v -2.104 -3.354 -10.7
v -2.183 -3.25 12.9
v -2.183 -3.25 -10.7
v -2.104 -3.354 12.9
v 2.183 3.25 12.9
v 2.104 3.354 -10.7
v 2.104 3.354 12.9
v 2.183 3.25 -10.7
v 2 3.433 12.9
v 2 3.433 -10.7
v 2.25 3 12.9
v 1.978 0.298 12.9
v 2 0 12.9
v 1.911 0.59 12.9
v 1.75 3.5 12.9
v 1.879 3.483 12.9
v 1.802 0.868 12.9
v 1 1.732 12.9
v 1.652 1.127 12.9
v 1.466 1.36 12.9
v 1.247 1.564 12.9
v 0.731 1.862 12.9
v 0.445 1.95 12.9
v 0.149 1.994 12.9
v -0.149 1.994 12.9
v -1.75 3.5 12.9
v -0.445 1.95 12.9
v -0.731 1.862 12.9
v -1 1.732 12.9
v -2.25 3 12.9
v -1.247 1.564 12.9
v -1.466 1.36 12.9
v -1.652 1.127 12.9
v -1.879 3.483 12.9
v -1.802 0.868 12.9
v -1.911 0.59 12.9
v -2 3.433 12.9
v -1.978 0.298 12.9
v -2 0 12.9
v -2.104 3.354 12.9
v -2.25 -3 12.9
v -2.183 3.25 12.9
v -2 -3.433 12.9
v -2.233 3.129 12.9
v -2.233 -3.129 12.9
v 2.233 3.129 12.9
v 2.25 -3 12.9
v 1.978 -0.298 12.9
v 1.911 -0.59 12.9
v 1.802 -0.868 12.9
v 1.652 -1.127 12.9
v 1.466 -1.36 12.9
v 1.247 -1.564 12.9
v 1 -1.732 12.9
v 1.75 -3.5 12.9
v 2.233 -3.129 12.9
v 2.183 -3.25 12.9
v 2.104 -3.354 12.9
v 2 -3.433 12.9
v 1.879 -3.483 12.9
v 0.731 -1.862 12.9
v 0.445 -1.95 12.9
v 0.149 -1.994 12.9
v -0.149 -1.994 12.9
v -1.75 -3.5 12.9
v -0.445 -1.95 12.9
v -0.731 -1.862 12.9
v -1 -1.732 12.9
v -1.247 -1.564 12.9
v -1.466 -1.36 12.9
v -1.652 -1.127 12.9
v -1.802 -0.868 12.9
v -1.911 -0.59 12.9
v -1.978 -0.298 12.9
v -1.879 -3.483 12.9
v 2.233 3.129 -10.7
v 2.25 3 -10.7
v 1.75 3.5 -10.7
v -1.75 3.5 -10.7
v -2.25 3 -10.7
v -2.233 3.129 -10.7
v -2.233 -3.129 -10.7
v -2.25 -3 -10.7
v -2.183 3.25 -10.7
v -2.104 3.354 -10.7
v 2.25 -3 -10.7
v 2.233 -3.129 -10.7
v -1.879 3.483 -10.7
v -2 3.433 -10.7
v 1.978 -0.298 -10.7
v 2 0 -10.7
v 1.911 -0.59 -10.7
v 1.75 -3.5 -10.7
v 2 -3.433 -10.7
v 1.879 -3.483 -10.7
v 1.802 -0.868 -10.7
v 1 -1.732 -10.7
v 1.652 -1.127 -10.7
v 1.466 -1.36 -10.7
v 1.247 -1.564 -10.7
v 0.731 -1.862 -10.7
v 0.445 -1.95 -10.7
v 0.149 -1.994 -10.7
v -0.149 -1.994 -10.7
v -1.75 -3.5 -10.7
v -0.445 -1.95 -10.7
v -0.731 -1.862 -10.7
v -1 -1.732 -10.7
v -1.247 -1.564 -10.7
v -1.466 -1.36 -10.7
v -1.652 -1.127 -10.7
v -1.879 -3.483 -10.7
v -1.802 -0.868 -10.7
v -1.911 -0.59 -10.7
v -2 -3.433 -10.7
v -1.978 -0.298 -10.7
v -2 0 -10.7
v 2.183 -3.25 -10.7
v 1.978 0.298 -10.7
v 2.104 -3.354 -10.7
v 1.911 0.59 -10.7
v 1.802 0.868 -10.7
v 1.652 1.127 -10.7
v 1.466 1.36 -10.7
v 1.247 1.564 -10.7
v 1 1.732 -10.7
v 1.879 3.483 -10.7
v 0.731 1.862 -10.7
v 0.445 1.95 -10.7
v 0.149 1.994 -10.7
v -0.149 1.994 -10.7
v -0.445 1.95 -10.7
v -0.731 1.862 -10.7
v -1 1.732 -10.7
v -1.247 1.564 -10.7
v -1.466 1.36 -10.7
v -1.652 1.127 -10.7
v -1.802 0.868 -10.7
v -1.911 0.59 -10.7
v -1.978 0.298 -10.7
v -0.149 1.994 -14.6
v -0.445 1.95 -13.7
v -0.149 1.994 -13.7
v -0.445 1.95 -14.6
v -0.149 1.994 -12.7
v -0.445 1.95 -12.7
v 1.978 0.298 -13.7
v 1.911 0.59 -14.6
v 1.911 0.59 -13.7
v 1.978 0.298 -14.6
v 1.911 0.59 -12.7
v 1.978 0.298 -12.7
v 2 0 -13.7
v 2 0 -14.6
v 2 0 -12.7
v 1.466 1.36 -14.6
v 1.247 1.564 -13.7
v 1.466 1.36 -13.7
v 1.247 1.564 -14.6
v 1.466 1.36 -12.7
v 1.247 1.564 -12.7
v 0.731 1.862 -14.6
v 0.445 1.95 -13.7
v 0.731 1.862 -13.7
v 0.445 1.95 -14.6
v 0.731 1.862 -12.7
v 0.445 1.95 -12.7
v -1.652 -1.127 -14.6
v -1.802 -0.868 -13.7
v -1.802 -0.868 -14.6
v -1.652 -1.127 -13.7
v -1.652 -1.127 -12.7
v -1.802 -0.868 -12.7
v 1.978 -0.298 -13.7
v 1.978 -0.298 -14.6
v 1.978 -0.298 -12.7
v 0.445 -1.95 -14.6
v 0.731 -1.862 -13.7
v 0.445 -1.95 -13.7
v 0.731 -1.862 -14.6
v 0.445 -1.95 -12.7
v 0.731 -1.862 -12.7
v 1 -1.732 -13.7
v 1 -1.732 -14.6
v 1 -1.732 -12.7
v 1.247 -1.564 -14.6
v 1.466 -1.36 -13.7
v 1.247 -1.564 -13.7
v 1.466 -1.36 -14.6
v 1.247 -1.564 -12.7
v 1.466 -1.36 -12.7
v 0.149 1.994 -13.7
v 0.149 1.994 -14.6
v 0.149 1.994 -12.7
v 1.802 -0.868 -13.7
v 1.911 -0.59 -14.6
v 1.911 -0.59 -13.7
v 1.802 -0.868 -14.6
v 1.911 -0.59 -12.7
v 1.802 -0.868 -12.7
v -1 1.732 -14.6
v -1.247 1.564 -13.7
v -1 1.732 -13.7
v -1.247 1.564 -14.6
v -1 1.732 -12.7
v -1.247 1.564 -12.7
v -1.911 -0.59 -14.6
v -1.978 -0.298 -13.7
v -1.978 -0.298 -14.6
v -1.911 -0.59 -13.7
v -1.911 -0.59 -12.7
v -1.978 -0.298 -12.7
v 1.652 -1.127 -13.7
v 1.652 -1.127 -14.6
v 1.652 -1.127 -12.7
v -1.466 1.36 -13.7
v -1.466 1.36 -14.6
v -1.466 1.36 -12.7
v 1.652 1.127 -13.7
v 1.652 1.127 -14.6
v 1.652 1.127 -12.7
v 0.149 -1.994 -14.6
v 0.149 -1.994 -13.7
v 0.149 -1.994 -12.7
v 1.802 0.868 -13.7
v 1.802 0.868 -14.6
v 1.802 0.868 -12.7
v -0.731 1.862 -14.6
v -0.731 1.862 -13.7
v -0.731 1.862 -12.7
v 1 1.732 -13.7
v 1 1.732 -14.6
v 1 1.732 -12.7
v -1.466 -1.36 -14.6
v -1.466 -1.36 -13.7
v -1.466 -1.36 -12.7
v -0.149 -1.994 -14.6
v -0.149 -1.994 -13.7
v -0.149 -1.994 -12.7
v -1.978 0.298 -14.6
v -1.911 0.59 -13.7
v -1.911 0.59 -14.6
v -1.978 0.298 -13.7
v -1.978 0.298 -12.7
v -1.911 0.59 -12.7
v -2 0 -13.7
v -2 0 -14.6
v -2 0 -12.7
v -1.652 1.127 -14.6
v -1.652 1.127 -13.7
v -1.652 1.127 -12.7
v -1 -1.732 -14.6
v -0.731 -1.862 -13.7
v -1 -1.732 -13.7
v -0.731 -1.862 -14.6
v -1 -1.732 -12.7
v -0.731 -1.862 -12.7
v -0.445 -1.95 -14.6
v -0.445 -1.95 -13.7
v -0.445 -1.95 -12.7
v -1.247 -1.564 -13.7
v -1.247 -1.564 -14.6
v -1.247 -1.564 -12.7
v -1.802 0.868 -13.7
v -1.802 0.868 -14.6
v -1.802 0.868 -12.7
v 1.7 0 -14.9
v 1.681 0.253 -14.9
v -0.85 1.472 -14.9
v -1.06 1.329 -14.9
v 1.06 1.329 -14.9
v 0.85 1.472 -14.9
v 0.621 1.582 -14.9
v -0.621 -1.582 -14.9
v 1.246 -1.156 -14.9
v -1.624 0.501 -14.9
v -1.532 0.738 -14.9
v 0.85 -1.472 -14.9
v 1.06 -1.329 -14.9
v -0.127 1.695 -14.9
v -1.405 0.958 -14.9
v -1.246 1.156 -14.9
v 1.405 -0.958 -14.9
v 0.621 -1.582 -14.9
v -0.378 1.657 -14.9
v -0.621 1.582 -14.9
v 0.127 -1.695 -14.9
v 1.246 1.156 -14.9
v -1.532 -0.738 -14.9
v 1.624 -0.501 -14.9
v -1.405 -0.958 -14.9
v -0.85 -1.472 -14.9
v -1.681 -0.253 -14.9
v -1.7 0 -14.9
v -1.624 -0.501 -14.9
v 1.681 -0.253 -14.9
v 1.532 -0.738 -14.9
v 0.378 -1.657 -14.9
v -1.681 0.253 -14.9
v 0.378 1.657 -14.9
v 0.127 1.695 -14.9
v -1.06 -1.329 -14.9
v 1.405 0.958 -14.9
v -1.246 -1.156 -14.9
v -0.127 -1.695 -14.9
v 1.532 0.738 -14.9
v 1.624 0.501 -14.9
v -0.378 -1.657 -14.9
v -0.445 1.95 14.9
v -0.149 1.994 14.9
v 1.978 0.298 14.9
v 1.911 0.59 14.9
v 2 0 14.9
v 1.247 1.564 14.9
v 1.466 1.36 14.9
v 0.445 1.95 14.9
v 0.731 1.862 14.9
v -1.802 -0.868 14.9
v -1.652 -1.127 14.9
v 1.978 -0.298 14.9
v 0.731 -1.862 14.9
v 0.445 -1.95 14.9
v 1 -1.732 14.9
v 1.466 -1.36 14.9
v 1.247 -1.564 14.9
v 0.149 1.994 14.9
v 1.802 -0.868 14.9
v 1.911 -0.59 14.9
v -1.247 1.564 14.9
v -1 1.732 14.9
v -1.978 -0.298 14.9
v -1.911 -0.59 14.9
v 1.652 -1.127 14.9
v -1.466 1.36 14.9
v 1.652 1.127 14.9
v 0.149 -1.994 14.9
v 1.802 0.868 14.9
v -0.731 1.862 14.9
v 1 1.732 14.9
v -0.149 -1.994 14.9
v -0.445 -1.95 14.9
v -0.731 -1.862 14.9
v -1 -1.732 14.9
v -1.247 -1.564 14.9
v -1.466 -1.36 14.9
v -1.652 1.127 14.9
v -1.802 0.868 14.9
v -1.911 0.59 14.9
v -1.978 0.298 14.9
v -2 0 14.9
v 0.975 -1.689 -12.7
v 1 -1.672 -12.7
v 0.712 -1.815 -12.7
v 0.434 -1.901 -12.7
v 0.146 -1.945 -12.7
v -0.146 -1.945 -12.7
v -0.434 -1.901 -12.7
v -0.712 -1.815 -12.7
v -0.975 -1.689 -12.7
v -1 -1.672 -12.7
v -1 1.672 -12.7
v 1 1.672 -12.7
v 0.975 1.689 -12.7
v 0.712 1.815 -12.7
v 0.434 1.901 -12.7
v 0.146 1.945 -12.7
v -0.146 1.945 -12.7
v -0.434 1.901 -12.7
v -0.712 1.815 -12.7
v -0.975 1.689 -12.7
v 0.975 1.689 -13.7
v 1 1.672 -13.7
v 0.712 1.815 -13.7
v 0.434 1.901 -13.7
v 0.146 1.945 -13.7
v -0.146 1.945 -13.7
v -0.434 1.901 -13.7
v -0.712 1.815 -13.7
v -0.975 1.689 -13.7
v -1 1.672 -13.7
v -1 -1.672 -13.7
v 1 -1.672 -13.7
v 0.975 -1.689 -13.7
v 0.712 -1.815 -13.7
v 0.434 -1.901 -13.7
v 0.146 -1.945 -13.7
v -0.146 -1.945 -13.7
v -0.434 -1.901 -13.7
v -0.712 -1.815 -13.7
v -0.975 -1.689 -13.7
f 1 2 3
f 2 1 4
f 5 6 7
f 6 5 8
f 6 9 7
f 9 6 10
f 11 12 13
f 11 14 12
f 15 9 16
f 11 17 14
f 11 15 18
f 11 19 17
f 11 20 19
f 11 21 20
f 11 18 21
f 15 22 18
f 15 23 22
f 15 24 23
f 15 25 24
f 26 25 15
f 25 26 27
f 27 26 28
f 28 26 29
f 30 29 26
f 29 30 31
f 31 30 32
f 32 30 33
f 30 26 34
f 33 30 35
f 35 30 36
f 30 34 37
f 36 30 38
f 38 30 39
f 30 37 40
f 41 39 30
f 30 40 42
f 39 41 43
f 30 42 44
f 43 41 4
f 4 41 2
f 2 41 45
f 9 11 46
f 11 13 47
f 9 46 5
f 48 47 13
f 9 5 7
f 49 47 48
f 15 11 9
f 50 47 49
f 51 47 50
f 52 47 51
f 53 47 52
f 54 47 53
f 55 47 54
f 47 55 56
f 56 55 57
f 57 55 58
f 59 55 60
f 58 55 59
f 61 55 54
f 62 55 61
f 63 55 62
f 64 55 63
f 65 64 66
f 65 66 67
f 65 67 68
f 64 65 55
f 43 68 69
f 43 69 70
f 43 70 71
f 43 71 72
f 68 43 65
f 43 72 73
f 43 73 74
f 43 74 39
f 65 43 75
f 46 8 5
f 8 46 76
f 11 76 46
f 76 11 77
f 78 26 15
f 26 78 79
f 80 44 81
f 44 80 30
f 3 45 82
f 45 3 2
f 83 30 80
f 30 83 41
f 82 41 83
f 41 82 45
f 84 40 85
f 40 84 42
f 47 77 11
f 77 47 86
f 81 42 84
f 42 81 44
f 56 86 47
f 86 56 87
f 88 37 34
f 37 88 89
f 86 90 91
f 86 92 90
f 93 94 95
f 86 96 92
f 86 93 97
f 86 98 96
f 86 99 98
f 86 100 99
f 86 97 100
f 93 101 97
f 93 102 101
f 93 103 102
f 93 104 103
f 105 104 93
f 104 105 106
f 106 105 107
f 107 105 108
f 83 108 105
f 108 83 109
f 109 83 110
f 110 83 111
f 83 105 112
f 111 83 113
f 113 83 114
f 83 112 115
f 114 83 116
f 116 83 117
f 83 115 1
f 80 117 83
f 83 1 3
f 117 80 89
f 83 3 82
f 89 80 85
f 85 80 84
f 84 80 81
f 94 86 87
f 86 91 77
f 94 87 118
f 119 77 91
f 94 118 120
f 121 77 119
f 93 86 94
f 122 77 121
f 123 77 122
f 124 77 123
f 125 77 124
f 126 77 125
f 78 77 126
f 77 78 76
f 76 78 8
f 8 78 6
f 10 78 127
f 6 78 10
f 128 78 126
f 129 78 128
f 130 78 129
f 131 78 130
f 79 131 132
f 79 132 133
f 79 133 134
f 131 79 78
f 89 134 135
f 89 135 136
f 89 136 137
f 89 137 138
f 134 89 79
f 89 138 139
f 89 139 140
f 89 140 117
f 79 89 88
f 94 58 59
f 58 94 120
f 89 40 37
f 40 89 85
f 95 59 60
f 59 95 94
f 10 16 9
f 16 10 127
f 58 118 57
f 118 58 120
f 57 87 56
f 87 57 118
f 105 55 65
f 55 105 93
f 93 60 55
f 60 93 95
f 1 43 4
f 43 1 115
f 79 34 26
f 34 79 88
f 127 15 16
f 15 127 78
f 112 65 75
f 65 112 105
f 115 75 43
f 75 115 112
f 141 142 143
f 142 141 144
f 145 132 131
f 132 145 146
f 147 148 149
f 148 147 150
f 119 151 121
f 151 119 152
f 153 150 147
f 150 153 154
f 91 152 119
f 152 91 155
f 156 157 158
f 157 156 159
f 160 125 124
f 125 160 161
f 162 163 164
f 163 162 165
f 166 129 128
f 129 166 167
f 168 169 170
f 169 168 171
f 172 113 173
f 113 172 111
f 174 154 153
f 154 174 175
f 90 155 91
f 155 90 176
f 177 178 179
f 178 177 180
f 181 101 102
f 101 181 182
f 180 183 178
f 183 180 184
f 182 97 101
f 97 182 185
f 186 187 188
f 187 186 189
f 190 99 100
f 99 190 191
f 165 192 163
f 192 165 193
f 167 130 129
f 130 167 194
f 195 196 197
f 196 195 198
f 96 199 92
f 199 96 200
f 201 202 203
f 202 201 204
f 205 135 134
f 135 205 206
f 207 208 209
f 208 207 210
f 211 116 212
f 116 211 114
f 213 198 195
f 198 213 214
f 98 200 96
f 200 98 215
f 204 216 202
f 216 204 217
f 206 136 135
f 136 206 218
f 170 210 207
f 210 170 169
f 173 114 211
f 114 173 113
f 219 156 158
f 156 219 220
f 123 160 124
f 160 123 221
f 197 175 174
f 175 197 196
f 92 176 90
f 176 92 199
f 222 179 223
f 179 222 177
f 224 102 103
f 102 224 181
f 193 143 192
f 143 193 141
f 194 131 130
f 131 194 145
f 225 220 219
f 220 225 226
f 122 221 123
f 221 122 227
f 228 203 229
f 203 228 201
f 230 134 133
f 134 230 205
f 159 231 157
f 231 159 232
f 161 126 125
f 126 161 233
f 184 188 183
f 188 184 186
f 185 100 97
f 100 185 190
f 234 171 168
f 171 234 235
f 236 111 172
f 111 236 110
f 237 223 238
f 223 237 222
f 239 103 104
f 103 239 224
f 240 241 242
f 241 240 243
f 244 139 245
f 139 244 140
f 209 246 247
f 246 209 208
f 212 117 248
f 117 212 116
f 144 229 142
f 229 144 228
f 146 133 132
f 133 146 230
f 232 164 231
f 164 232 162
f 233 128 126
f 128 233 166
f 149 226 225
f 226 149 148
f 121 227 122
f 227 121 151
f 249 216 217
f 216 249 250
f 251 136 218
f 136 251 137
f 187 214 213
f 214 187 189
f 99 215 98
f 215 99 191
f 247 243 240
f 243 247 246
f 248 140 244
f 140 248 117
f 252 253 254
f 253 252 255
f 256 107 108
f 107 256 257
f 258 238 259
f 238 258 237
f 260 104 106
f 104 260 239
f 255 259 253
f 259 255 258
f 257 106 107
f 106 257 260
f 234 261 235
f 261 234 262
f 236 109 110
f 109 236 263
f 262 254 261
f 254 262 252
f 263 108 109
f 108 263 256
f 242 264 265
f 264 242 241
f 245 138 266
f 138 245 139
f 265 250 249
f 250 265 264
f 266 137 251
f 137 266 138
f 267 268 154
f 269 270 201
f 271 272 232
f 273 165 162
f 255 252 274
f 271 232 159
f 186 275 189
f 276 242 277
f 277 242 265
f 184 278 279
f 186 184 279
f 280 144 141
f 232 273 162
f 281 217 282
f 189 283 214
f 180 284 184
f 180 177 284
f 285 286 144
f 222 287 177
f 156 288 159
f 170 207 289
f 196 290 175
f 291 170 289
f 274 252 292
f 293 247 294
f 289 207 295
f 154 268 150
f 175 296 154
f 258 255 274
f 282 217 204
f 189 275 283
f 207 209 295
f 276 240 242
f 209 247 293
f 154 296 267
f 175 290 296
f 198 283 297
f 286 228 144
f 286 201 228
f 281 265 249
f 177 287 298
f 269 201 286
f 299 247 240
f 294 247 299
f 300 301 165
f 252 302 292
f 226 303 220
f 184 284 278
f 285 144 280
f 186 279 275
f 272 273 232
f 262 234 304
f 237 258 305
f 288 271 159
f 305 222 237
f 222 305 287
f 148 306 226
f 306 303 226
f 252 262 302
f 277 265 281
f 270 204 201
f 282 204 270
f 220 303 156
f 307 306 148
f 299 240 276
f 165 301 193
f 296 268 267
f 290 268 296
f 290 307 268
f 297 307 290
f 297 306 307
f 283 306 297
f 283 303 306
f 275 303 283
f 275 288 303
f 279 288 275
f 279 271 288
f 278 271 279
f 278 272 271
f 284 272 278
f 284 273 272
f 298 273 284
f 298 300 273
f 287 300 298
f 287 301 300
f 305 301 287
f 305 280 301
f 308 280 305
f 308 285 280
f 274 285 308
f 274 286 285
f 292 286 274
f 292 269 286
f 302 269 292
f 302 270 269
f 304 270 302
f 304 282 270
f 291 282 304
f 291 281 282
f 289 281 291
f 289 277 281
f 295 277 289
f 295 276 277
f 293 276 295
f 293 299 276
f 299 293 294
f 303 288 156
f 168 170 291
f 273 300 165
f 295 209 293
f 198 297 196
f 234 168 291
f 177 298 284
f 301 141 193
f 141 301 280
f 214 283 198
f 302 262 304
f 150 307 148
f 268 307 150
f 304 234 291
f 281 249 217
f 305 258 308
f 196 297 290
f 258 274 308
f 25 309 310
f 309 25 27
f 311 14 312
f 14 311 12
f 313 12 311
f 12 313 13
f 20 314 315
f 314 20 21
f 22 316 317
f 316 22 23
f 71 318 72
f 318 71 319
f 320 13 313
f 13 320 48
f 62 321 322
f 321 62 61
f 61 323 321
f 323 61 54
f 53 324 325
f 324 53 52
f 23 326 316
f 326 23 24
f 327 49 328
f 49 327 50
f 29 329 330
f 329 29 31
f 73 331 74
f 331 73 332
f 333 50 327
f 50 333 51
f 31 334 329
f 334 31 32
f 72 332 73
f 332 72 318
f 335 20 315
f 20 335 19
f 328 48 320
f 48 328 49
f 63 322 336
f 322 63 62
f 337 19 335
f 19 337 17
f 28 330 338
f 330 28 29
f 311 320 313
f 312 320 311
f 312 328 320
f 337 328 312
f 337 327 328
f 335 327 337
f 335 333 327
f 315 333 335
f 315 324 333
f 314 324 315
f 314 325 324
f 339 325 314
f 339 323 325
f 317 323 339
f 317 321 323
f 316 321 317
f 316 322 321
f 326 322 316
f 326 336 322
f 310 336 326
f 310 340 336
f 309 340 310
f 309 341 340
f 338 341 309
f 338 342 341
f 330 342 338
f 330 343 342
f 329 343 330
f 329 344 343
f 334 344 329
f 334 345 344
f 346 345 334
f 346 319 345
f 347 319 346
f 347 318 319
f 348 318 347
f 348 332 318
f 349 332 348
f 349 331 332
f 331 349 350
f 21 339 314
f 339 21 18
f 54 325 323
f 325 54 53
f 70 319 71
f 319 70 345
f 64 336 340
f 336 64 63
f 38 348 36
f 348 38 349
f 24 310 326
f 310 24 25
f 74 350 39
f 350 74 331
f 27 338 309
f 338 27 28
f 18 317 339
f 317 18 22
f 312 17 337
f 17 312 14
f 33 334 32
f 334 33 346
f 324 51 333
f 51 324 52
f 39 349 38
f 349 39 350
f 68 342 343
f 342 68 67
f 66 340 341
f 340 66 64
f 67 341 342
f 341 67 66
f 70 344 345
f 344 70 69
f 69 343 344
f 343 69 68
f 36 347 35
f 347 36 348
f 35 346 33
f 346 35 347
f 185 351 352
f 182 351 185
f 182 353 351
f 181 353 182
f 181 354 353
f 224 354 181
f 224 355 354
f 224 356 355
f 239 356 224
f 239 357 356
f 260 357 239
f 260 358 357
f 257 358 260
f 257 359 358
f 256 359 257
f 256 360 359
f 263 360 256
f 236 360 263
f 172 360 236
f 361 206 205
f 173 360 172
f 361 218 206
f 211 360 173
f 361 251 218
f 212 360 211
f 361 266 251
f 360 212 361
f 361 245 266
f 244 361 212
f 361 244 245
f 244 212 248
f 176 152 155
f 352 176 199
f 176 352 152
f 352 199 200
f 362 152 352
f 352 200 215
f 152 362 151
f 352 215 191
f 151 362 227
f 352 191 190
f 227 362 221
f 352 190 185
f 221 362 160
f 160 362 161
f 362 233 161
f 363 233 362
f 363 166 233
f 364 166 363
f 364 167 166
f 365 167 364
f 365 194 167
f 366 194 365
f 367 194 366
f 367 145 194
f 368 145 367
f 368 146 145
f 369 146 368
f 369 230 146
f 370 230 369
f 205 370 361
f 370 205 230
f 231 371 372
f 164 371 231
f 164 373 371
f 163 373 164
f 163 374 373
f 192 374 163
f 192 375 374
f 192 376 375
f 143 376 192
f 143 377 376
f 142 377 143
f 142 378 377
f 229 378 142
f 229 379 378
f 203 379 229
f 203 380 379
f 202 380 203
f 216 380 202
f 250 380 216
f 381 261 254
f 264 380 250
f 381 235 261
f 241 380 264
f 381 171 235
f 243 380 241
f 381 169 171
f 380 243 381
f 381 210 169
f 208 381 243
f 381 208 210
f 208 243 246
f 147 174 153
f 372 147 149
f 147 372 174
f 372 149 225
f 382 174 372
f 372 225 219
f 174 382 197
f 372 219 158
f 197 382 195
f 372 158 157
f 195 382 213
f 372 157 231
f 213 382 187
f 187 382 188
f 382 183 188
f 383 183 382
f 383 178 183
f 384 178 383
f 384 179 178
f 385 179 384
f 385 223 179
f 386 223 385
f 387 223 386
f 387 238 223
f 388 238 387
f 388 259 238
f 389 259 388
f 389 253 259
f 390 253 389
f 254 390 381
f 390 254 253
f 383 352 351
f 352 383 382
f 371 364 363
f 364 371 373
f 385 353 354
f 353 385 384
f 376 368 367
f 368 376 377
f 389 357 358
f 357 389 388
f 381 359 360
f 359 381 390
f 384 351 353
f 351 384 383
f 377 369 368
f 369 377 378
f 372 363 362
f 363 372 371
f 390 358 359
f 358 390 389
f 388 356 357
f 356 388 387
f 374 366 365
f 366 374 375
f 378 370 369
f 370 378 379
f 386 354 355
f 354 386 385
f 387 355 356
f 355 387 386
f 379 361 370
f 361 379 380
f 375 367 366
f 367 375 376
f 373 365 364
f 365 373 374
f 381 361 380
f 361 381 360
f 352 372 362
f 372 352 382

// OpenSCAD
// part_id: b5
// name: B5 fitted post
// source_drawing_ids: DRW-002
// units: mm
// revision: 0.1
// SPDX-License-Identifier: MIT

module rounded_rect_2d(w = 4.5, d = 4.0, r = 0.5) {
    hull() {
        for (sx = [-1, 1])
            for (sy = [-1, 1])
                translate([sx * (w / 2 - r), sy * (d / 2 - r)])
                    circle(r = r, $fn = 24);
    }
}

// Main body axis is +Z.
module part_b5(
    body_w = 4.5,
    body_d = 7.0,
    body_r = 0.5,
    body_h = 23.6,
    top_stub_d = 4.0,
    top_stub_h = 2.0,
    bottom_stub_d = 4.0,
    bottom_stub_h = 4.2,
    bottom_chamfer_r = 0.3,
    lower_recess_d = 3.9,
    lower_recess_z = 1.2,
    lower_recess_h = 1.0,
    lower_slot_w = 4.0,
    lower_slot_d = 7.0,
    lower_slot_h = 1.0,
    lower_slot_offset = 3.0
) {
    total_h = bottom_stub_h + body_h + top_stub_h;

    translate([0, 0, -total_h / 2])
        difference() {
            union() {
                // Main fitted post body with rounded corners.
                translate([0, 0, bottom_stub_h])
                    linear_extrude(height = body_h)
                        rounded_rect_2d(w = body_w, d = body_d, r = body_r);

                // Bottom cylinder with small lower chamfer.
                translate([0, 0, bottom_chamfer_r])
                    cylinder(d = bottom_stub_d, h = bottom_stub_h - bottom_chamfer_r, center = false, $fn = 42);
                cylinder(d1 = bottom_stub_d - 2 * bottom_chamfer_r, d2 = bottom_stub_d, h = bottom_chamfer_r, center = false, $fn = 42);

                // Top locating peg.
                translate([0, 0, bottom_stub_h + body_h])
                    cylinder(d = top_stub_d, h = top_stub_h, center = false, $fn = 42);
            }

            // Annular recess in lower cylinder.
            difference() {
                translate([0, 0, lower_recess_z])
                    cylinder(d = bottom_stub_d + 1, h = lower_recess_h, center = false, $fn = 42);
                translate([0, 0, lower_recess_z])
                    cylinder(d = lower_recess_d, h = lower_recess_h, center = false, $fn = 42);
            }

            // Opposed slot cuts in the recessed band.
            for (sx = [-1, 1])
                translate([sx * lower_slot_offset, 0, lower_recess_z + lower_slot_h / 2])
                    cube([lower_slot_w, lower_slot_d, lower_slot_h], center = true);
        }
}

// ---- "main guard" ----
// Default to previewing when opened directly:
if (is_undef(__LIB_MODE__)) {
    part_b5();
}
